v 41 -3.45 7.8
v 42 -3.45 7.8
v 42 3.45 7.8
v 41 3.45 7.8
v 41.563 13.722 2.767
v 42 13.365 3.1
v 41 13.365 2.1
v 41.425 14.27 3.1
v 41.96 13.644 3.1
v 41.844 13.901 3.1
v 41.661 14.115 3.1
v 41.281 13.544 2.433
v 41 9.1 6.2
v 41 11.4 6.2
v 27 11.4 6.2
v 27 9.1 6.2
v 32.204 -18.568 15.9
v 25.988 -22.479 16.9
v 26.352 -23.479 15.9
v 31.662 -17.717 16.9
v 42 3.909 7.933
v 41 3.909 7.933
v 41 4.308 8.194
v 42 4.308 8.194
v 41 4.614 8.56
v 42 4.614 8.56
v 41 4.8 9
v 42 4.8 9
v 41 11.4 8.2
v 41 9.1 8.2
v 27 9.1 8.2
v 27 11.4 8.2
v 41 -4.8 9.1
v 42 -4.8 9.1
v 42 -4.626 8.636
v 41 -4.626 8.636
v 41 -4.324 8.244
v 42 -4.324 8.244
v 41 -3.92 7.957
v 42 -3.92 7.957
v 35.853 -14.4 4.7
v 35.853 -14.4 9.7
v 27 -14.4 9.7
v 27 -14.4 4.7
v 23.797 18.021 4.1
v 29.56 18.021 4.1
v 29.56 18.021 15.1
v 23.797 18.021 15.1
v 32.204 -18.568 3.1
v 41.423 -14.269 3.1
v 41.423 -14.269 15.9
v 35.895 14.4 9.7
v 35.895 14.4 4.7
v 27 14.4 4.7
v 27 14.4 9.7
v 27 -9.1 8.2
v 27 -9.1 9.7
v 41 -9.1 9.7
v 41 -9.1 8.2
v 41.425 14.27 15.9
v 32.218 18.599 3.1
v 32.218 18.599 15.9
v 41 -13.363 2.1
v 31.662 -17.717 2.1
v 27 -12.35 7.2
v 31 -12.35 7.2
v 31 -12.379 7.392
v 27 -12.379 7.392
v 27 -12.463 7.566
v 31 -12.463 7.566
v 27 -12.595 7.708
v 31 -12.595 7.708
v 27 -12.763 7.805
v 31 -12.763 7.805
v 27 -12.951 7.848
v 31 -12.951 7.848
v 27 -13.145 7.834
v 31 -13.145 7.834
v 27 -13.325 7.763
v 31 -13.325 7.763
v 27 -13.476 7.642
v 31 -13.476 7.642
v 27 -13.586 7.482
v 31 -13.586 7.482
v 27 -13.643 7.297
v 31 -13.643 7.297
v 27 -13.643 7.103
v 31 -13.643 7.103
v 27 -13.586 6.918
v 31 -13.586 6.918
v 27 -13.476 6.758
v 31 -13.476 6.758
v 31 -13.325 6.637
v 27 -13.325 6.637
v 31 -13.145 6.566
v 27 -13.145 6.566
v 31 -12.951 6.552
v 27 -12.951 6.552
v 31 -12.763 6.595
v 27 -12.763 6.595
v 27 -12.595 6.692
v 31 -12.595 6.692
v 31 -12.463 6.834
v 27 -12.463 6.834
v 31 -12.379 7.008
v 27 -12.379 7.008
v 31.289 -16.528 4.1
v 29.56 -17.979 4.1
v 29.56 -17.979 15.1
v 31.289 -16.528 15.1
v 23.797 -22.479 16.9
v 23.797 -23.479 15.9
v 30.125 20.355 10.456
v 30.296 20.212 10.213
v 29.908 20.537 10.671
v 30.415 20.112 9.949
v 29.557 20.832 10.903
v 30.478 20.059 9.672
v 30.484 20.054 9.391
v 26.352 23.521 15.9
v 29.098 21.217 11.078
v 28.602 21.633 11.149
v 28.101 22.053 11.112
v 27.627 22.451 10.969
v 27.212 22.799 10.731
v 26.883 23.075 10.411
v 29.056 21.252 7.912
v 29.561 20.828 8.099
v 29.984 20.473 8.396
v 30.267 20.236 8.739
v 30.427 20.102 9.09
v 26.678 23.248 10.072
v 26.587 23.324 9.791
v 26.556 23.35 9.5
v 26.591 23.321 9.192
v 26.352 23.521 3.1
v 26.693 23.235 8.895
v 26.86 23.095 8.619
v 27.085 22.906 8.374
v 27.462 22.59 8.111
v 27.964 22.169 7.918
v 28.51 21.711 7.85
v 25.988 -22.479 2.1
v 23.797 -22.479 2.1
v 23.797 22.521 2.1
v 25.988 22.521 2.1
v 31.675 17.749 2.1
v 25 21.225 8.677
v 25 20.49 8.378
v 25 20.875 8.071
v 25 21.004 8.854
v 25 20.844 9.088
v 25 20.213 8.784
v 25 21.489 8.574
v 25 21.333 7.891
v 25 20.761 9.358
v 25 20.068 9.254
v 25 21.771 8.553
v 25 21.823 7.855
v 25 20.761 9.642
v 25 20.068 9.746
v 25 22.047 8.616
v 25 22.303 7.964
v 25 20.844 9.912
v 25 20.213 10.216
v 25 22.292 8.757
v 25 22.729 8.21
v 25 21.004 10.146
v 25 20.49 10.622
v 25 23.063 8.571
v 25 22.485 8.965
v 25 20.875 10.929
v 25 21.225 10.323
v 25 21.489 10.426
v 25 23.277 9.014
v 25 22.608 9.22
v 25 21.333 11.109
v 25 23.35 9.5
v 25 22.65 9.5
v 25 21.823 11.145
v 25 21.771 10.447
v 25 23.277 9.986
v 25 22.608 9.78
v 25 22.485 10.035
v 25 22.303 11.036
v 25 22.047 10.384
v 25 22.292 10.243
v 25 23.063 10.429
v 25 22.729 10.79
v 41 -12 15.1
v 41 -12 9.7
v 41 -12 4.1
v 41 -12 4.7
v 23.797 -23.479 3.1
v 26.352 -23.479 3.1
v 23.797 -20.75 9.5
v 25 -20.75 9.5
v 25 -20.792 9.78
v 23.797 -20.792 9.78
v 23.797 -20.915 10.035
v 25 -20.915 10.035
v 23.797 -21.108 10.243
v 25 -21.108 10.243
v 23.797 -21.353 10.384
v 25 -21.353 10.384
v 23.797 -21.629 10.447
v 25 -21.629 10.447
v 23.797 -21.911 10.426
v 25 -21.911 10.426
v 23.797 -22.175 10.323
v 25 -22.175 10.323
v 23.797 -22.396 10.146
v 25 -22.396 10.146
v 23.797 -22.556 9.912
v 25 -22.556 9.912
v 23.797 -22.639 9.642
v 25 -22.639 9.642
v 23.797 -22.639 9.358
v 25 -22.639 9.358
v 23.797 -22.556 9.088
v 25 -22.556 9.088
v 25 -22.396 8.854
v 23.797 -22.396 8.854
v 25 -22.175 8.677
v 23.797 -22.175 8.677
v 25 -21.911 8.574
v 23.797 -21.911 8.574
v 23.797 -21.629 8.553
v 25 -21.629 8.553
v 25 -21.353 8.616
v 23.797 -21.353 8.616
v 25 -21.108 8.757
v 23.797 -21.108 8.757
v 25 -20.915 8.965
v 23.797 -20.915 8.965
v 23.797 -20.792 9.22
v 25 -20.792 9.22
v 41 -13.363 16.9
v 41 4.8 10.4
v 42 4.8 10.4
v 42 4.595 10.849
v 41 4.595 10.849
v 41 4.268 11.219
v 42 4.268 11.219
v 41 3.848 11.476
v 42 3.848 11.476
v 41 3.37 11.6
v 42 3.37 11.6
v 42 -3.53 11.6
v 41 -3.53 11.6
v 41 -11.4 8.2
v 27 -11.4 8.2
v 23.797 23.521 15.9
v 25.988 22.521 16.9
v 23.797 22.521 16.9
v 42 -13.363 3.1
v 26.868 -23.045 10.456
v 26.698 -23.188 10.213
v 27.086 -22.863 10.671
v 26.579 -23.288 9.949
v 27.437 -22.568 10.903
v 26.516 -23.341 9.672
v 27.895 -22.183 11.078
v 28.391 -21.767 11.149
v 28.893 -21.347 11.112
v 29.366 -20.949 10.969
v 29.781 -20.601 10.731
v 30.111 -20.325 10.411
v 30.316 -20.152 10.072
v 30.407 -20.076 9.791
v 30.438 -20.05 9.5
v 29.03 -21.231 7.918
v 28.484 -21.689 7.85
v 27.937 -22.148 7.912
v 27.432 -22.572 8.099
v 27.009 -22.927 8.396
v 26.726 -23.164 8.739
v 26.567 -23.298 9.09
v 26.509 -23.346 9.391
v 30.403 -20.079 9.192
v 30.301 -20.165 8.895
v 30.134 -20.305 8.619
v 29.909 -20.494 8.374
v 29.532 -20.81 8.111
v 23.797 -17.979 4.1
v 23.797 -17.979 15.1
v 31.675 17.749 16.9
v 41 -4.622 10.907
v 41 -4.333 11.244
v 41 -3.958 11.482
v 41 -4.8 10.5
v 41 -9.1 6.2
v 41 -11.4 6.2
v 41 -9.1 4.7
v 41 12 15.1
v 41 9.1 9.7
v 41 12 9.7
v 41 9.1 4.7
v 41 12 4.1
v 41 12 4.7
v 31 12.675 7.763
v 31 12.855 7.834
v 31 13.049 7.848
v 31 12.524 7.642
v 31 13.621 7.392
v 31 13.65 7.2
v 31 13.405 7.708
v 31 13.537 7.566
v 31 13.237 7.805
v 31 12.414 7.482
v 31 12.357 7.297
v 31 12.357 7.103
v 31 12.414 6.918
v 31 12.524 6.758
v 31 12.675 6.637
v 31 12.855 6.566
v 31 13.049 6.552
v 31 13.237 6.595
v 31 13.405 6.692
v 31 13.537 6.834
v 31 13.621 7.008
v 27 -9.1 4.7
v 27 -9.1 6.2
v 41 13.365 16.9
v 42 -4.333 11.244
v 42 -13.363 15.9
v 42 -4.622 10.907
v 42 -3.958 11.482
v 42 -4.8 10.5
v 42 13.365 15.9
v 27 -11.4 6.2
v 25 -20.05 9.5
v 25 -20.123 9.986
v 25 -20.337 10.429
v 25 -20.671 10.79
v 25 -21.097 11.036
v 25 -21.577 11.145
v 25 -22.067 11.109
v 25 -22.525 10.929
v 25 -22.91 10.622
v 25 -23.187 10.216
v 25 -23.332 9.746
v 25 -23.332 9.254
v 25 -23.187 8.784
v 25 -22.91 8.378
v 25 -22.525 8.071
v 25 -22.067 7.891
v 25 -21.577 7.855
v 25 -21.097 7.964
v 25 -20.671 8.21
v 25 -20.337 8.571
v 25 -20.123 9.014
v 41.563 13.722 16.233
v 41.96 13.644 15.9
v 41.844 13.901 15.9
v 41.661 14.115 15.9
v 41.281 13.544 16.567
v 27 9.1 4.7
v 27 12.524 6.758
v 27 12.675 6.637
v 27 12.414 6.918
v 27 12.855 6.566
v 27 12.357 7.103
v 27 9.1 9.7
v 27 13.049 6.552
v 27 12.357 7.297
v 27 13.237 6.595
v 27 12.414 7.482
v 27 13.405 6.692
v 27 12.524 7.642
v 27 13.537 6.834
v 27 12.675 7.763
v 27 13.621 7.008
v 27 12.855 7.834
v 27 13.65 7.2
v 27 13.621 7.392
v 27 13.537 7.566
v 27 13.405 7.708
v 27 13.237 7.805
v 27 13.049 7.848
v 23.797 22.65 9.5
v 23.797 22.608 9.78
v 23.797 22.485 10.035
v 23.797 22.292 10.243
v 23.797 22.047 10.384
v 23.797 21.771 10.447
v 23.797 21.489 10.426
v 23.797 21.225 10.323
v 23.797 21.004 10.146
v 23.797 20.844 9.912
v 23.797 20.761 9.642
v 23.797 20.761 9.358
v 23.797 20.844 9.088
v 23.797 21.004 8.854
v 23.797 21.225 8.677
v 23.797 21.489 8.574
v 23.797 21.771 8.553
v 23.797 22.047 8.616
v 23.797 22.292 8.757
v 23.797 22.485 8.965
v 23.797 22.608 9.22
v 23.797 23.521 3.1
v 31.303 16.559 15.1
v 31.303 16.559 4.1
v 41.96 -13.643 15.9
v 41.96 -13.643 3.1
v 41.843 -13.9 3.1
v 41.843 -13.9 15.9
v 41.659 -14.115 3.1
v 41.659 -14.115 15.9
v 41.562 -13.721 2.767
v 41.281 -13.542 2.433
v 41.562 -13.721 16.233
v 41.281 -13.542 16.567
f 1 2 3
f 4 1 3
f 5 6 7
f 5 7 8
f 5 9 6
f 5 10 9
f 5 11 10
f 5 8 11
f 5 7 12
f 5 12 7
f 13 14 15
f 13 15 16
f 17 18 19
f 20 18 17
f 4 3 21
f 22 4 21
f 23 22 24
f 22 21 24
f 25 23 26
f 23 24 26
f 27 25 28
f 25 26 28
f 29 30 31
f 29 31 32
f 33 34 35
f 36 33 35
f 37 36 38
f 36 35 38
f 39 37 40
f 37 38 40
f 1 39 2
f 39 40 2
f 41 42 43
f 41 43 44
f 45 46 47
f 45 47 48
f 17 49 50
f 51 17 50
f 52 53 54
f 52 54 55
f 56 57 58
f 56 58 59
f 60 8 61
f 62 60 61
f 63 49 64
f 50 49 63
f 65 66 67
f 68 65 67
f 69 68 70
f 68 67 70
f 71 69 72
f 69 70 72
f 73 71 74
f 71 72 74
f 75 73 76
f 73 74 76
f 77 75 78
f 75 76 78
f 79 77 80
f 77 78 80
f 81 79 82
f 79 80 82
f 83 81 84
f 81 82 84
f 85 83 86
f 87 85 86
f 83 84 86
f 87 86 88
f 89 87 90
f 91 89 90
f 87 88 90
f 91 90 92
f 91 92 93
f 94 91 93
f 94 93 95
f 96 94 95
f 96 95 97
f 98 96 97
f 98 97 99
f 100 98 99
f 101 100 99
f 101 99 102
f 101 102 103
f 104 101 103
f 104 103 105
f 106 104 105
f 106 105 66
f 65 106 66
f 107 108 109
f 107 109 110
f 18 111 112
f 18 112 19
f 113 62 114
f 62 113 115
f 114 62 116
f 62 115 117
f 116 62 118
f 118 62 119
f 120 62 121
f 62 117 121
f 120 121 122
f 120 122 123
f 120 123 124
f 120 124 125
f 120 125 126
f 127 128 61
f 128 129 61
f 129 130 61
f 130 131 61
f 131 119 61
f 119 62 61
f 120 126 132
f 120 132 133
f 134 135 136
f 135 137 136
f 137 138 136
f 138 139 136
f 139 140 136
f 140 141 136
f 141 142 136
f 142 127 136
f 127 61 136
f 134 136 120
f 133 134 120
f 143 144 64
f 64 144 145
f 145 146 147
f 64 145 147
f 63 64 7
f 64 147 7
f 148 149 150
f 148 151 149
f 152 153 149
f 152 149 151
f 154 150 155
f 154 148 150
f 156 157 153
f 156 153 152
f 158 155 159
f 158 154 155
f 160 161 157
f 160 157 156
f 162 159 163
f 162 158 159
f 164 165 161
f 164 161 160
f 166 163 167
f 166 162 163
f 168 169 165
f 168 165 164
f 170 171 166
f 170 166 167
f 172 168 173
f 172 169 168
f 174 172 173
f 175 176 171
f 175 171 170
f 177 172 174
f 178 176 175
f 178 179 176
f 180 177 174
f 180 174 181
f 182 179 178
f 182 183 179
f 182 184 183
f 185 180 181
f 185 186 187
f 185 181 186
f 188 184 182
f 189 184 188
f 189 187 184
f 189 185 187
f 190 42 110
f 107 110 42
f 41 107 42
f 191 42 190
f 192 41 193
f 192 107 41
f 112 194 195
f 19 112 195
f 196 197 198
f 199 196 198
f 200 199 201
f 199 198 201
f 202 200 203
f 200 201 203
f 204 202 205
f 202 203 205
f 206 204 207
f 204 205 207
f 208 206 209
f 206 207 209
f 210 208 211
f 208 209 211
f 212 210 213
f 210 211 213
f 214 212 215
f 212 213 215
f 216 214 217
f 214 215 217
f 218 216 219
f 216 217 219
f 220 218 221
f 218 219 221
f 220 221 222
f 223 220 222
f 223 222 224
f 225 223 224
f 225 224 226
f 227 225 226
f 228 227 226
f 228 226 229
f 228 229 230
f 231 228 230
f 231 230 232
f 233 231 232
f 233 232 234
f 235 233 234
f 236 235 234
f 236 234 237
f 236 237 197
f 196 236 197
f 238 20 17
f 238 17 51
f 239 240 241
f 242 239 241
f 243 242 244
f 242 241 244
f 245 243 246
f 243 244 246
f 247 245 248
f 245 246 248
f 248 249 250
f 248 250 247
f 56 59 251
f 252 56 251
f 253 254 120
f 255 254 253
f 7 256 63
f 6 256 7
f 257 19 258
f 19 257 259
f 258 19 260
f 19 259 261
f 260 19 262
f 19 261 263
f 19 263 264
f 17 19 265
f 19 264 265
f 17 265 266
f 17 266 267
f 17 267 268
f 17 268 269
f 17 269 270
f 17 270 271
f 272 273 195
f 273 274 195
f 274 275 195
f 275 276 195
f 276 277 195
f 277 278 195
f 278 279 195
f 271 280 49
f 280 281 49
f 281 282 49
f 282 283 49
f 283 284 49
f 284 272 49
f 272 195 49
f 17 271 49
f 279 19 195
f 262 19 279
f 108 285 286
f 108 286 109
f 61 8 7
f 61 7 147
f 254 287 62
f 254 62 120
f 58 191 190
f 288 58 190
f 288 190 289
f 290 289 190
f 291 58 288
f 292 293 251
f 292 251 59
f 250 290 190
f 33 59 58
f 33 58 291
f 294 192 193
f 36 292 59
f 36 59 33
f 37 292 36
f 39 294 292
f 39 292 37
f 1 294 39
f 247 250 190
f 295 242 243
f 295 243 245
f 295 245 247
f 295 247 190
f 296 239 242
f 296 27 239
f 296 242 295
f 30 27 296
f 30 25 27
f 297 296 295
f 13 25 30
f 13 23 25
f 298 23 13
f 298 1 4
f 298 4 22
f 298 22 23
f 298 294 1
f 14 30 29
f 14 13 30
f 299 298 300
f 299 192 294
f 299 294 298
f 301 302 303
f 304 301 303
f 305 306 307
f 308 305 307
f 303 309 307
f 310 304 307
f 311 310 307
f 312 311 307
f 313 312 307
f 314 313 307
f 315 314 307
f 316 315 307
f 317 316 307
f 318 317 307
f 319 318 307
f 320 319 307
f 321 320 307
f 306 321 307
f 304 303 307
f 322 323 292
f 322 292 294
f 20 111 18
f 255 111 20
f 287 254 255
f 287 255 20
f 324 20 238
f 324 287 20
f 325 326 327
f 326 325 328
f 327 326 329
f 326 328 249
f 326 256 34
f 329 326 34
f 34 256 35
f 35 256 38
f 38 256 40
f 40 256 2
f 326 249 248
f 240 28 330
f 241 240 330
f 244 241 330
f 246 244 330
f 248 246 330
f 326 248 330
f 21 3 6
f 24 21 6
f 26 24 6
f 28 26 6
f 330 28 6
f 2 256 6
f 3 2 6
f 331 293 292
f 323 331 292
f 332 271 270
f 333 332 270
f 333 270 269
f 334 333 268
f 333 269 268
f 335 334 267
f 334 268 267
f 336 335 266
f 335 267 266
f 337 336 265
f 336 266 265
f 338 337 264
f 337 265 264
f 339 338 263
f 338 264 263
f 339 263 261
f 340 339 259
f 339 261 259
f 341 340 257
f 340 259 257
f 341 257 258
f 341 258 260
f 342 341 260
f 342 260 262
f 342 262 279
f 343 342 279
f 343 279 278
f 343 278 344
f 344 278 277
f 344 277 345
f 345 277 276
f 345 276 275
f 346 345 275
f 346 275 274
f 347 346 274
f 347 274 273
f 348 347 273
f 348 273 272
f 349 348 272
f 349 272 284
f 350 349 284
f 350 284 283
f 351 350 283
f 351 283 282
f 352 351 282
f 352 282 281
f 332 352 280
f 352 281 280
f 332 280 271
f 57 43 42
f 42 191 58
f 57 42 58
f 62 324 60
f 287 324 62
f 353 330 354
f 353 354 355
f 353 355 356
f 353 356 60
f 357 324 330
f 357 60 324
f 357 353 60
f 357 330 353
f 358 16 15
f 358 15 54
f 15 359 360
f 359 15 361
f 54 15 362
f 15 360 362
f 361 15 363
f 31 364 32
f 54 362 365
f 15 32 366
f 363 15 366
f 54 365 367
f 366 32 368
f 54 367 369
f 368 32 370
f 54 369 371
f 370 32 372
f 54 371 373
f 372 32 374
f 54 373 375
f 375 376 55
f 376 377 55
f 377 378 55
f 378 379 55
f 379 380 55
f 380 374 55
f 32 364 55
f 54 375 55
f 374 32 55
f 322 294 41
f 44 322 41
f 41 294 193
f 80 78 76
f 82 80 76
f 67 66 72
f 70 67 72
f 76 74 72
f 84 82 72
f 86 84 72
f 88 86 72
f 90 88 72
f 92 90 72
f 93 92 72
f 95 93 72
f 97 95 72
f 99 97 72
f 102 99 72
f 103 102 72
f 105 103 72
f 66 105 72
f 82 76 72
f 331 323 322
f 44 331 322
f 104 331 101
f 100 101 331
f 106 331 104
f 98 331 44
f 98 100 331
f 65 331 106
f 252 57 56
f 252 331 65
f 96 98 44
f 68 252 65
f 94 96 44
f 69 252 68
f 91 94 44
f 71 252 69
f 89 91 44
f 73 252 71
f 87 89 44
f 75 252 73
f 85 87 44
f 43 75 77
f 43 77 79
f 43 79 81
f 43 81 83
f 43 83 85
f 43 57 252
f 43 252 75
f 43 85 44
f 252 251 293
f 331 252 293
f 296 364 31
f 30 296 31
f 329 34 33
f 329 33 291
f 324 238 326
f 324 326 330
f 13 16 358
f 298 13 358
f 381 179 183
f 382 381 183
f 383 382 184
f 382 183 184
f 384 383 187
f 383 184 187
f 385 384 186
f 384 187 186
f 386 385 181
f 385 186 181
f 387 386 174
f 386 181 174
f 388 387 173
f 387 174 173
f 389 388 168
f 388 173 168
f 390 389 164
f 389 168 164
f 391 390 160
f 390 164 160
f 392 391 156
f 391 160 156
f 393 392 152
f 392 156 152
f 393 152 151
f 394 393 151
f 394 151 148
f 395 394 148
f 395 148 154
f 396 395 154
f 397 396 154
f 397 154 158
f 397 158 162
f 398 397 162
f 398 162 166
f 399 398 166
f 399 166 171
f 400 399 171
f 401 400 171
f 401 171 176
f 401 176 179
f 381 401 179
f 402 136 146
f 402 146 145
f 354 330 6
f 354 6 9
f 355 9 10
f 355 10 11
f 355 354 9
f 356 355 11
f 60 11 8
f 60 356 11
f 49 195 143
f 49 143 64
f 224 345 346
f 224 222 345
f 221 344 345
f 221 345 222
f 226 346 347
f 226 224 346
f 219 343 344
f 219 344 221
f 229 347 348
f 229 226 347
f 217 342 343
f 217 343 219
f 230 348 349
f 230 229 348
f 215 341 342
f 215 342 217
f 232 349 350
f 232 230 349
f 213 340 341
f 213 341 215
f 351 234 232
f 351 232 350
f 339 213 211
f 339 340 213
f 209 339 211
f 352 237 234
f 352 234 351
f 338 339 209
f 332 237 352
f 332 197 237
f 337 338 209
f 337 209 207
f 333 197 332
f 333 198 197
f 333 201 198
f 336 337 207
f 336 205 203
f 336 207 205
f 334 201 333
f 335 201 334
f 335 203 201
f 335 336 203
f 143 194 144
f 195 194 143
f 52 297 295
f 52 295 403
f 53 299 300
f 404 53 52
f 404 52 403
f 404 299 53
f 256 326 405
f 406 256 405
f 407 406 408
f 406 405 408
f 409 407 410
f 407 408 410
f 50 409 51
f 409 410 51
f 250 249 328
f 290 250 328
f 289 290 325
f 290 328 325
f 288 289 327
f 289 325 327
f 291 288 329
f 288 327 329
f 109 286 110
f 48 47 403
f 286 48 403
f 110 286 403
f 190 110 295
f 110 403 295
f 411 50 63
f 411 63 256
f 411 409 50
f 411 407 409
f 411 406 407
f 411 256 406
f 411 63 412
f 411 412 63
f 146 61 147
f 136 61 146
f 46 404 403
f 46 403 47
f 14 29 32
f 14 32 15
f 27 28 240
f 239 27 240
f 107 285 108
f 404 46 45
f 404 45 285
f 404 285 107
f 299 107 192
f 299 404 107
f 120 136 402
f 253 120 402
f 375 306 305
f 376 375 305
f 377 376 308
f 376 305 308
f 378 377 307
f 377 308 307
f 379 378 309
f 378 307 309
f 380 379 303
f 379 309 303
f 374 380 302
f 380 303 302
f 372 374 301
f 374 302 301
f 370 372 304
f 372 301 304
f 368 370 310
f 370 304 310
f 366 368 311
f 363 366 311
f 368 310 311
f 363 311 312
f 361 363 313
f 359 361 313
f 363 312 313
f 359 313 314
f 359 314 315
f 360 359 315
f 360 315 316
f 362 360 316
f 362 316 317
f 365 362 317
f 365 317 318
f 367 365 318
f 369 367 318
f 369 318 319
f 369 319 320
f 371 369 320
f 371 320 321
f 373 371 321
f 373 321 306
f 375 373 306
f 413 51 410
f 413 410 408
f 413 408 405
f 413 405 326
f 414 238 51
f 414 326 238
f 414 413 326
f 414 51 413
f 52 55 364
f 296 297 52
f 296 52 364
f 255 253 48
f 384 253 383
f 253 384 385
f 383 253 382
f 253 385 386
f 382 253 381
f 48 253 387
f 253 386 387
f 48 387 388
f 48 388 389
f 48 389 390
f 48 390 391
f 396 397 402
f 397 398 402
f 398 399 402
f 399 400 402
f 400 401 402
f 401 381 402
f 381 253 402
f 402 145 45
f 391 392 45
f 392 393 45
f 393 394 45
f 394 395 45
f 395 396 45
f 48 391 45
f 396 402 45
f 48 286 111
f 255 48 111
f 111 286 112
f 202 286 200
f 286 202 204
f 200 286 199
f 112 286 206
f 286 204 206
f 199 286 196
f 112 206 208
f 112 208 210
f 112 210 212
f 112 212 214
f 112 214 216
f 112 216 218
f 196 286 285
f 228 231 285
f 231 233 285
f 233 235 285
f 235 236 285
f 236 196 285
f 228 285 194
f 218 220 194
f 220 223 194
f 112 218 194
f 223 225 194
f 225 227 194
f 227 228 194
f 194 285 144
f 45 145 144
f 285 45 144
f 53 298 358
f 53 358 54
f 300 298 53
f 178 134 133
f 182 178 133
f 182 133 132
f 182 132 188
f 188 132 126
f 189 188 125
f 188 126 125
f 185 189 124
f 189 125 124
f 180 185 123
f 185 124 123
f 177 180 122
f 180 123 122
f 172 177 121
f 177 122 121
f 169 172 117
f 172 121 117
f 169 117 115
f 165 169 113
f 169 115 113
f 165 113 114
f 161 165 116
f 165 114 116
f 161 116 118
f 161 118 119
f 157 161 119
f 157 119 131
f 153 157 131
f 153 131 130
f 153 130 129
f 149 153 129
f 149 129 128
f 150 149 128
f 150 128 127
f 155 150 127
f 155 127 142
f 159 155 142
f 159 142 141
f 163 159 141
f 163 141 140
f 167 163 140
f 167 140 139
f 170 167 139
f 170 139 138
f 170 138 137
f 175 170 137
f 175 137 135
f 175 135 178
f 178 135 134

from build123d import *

# Parameters (mm, degrees)
PAD022_DEPTH    = 14.8
POCKET021_DEPTH = 11
PAD023_DEPTH    = 14
POCKET022_DEPTH = 2
SKETCH053_R     = 0.95
POCKET023_DEPTH = 22
SKETCH054_R     = 1.65
POCKET024_DEPTH = 20
FILLET006_R     = 1
CHAMFER022_SIZE = 1
SKETCH055_R     = 0.65
POCKET025_DEPTH = 5


with BuildPart() as part:
    # Sketch049 → Pad022 (new body)
    with BuildSketch(Plane.XY.offset(2.1)):
        Polygon((0, 0), (0, 14), (-9.781659, 18.59873), (-15.64829, 23.521417), (-18.20313, 23.521417), (-18.20313, -23.478583), (-15.64829, -23.478583), (-9.796058, -18.567977), (0, -14), align=None)
    extrude(amount=PAD022_DEPTH)

    # Sketch050 → Pocket021 (cut)
    with BuildSketch(Plane(origin=(-1, 0, 4.1), x_dir=(1, 0, 0), z_dir=(0, 0, 1))):
        Polygon((0, 0), (0, 12), (-9.697087, 16.558969), (-11.439745, 18.021232), (-25.20447, 18.021232), (-25.20447, -17.978768), (-11.439745, -17.978768), (-9.711362, -16.528482), (0, -12), align=None)
    extrude(amount=POCKET021_DEPTH, mode=Mode.SUBTRACT)

    # Sketch051 → Pad023 (join)
    with BuildSketch(Plane(origin=(-1, 0, 7.2), x_dir=(0, 1, 0), z_dir=(1, 0, 0))):
        Polygon((-14.4, 0), (-14.4, 2.5), (-9.1, 2.5), (-9.1, 1), (-11.4, 1), (-11.4, -1), (-9.1, -1), (-9.1, -2.5), (-14.4, -2.5), align=None)
        Polygon((9.1, 1), (11.4, 1), (11.4, 0), (11.4, -1), (9.1, -1), (9.1, -2.5), (14.4, -2.5), (14.4, 2.5), (9.1, 2.5), align=None)
    extrude(amount=-PAD023_DEPTH)

    # Sketch052 → Pocket022 (cut)
    with BuildSketch(Plane(origin=(0, 0, 9.7), x_dir=(0, 1, 0), z_dir=(1, 0, 0))):
        with BuildLine():
            Line((-3.53, 1.9), (3.37, 1.9))
            ThreePointArc((4.8, 0.7), (4.268438, 1.518597), (3.37, 1.9))
            Line((4.8, -0.7), (4.8, 0.7))
            ThreePointArc((3.45, -1.9), (4.308438, -1.506368), (4.8, -0.7))
            Line((-3.45, -1.9), (3.45, -1.9))
            ThreePointArc((-4.8, -0.6), (-4.323725, -1.456368), (-3.45, -1.9))
            Line((-4.8, -0.6), (-4.8, 0.8))
            ThreePointArc((-3.53, 1.9), (-4.333152, 1.544139), (-4.8, 0.8))
        make_face()
    extrude(amount=-POCKET022_DEPTH, mode=Mode.SUBTRACT)

    # Sketch053 → Pocket023 (cut)
    with BuildSketch(Plane.YZ):
        with Locations((-21.7, 9.5)):
            Circle(SKETCH053_R)
        with Locations((21.7, 9.5)):
            Circle(SKETCH053_R)
    extrude(amount=-POCKET023_DEPTH, mode=Mode.SUBTRACT)

    # Sketch054 → Pocket024 (cut)
    with BuildSketch(Plane.YZ.offset(3)):
        with Locations((-21.7, 9.5)):
            Circle(SKETCH054_R)
        with Locations((21.7, 9.5)):
            Circle(SKETCH054_R)
    extrude(amount=-POCKET024_DEPTH, mode=Mode.SUBTRACT)

    # Fillet006
    fillet006_edges = [part.edges().sort_by_distance(p)[0] for p in [
        (0, -14, 9.5),
        (0, 14, 9.5),
    ]]
    fillet(fillet006_edges, radius=FILLET006_R)

    # Chamfer022
    chamfer022_edges = [part.edges().sort_by_distance(p)[0] for p in [
        (-12.714975, 21.060074, 2.1),
        (-16.92571, 23.521417, 2.1),
        (-5.178098, 16.434421, 2.1),
        (0, 6.682568, 2.1),
        (-0.155766, 13.90111, 2.1),
        (0, -6.681465, 2.1),
        (-12.722174, -21.02328, 2.1),
        (-16.92571, -23.478583, 2.1),
        (-5.18672, -16.418607, 2.1),
        (-0.156609, -13.900229, 2.1),
        (-16.92571, -23.478583, 16.9),
        (-12.722174, -21.02328, 16.9),
        (-5.18672, -16.418607, 16.9),
        (-0.156609, -13.900229, 16.9),
        (0, -6.681465, 16.9),
        (0, 6.682568, 16.9),
        (-5.178098, 16.434421, 16.9),
        (-0.155766, 13.90111, 16.9),
        (-12.714975, 21.060074, 16.9),
        (-16.92571, 23.521417, 16.9),
    ]]
    chamfer(chamfer022_edges, length=CHAMFER022_SIZE)

    # Sketch055 → Pocket025 (cut)
    with BuildSketch(Plane.YZ.offset(-11)):
        with Locations((-13, 7.2)):
            Circle(SKETCH055_R)
        with Locations((13, 7.2)):
            Circle(SKETCH055_R)
    extrude(amount=-POCKET025_DEPTH, mode=Mode.SUBTRACT)


with BuildPart() as part_1:
    # Body018 placement: moved
    add(part.part.moved(Location((42, 0, 0))))


solid = part_1.part
